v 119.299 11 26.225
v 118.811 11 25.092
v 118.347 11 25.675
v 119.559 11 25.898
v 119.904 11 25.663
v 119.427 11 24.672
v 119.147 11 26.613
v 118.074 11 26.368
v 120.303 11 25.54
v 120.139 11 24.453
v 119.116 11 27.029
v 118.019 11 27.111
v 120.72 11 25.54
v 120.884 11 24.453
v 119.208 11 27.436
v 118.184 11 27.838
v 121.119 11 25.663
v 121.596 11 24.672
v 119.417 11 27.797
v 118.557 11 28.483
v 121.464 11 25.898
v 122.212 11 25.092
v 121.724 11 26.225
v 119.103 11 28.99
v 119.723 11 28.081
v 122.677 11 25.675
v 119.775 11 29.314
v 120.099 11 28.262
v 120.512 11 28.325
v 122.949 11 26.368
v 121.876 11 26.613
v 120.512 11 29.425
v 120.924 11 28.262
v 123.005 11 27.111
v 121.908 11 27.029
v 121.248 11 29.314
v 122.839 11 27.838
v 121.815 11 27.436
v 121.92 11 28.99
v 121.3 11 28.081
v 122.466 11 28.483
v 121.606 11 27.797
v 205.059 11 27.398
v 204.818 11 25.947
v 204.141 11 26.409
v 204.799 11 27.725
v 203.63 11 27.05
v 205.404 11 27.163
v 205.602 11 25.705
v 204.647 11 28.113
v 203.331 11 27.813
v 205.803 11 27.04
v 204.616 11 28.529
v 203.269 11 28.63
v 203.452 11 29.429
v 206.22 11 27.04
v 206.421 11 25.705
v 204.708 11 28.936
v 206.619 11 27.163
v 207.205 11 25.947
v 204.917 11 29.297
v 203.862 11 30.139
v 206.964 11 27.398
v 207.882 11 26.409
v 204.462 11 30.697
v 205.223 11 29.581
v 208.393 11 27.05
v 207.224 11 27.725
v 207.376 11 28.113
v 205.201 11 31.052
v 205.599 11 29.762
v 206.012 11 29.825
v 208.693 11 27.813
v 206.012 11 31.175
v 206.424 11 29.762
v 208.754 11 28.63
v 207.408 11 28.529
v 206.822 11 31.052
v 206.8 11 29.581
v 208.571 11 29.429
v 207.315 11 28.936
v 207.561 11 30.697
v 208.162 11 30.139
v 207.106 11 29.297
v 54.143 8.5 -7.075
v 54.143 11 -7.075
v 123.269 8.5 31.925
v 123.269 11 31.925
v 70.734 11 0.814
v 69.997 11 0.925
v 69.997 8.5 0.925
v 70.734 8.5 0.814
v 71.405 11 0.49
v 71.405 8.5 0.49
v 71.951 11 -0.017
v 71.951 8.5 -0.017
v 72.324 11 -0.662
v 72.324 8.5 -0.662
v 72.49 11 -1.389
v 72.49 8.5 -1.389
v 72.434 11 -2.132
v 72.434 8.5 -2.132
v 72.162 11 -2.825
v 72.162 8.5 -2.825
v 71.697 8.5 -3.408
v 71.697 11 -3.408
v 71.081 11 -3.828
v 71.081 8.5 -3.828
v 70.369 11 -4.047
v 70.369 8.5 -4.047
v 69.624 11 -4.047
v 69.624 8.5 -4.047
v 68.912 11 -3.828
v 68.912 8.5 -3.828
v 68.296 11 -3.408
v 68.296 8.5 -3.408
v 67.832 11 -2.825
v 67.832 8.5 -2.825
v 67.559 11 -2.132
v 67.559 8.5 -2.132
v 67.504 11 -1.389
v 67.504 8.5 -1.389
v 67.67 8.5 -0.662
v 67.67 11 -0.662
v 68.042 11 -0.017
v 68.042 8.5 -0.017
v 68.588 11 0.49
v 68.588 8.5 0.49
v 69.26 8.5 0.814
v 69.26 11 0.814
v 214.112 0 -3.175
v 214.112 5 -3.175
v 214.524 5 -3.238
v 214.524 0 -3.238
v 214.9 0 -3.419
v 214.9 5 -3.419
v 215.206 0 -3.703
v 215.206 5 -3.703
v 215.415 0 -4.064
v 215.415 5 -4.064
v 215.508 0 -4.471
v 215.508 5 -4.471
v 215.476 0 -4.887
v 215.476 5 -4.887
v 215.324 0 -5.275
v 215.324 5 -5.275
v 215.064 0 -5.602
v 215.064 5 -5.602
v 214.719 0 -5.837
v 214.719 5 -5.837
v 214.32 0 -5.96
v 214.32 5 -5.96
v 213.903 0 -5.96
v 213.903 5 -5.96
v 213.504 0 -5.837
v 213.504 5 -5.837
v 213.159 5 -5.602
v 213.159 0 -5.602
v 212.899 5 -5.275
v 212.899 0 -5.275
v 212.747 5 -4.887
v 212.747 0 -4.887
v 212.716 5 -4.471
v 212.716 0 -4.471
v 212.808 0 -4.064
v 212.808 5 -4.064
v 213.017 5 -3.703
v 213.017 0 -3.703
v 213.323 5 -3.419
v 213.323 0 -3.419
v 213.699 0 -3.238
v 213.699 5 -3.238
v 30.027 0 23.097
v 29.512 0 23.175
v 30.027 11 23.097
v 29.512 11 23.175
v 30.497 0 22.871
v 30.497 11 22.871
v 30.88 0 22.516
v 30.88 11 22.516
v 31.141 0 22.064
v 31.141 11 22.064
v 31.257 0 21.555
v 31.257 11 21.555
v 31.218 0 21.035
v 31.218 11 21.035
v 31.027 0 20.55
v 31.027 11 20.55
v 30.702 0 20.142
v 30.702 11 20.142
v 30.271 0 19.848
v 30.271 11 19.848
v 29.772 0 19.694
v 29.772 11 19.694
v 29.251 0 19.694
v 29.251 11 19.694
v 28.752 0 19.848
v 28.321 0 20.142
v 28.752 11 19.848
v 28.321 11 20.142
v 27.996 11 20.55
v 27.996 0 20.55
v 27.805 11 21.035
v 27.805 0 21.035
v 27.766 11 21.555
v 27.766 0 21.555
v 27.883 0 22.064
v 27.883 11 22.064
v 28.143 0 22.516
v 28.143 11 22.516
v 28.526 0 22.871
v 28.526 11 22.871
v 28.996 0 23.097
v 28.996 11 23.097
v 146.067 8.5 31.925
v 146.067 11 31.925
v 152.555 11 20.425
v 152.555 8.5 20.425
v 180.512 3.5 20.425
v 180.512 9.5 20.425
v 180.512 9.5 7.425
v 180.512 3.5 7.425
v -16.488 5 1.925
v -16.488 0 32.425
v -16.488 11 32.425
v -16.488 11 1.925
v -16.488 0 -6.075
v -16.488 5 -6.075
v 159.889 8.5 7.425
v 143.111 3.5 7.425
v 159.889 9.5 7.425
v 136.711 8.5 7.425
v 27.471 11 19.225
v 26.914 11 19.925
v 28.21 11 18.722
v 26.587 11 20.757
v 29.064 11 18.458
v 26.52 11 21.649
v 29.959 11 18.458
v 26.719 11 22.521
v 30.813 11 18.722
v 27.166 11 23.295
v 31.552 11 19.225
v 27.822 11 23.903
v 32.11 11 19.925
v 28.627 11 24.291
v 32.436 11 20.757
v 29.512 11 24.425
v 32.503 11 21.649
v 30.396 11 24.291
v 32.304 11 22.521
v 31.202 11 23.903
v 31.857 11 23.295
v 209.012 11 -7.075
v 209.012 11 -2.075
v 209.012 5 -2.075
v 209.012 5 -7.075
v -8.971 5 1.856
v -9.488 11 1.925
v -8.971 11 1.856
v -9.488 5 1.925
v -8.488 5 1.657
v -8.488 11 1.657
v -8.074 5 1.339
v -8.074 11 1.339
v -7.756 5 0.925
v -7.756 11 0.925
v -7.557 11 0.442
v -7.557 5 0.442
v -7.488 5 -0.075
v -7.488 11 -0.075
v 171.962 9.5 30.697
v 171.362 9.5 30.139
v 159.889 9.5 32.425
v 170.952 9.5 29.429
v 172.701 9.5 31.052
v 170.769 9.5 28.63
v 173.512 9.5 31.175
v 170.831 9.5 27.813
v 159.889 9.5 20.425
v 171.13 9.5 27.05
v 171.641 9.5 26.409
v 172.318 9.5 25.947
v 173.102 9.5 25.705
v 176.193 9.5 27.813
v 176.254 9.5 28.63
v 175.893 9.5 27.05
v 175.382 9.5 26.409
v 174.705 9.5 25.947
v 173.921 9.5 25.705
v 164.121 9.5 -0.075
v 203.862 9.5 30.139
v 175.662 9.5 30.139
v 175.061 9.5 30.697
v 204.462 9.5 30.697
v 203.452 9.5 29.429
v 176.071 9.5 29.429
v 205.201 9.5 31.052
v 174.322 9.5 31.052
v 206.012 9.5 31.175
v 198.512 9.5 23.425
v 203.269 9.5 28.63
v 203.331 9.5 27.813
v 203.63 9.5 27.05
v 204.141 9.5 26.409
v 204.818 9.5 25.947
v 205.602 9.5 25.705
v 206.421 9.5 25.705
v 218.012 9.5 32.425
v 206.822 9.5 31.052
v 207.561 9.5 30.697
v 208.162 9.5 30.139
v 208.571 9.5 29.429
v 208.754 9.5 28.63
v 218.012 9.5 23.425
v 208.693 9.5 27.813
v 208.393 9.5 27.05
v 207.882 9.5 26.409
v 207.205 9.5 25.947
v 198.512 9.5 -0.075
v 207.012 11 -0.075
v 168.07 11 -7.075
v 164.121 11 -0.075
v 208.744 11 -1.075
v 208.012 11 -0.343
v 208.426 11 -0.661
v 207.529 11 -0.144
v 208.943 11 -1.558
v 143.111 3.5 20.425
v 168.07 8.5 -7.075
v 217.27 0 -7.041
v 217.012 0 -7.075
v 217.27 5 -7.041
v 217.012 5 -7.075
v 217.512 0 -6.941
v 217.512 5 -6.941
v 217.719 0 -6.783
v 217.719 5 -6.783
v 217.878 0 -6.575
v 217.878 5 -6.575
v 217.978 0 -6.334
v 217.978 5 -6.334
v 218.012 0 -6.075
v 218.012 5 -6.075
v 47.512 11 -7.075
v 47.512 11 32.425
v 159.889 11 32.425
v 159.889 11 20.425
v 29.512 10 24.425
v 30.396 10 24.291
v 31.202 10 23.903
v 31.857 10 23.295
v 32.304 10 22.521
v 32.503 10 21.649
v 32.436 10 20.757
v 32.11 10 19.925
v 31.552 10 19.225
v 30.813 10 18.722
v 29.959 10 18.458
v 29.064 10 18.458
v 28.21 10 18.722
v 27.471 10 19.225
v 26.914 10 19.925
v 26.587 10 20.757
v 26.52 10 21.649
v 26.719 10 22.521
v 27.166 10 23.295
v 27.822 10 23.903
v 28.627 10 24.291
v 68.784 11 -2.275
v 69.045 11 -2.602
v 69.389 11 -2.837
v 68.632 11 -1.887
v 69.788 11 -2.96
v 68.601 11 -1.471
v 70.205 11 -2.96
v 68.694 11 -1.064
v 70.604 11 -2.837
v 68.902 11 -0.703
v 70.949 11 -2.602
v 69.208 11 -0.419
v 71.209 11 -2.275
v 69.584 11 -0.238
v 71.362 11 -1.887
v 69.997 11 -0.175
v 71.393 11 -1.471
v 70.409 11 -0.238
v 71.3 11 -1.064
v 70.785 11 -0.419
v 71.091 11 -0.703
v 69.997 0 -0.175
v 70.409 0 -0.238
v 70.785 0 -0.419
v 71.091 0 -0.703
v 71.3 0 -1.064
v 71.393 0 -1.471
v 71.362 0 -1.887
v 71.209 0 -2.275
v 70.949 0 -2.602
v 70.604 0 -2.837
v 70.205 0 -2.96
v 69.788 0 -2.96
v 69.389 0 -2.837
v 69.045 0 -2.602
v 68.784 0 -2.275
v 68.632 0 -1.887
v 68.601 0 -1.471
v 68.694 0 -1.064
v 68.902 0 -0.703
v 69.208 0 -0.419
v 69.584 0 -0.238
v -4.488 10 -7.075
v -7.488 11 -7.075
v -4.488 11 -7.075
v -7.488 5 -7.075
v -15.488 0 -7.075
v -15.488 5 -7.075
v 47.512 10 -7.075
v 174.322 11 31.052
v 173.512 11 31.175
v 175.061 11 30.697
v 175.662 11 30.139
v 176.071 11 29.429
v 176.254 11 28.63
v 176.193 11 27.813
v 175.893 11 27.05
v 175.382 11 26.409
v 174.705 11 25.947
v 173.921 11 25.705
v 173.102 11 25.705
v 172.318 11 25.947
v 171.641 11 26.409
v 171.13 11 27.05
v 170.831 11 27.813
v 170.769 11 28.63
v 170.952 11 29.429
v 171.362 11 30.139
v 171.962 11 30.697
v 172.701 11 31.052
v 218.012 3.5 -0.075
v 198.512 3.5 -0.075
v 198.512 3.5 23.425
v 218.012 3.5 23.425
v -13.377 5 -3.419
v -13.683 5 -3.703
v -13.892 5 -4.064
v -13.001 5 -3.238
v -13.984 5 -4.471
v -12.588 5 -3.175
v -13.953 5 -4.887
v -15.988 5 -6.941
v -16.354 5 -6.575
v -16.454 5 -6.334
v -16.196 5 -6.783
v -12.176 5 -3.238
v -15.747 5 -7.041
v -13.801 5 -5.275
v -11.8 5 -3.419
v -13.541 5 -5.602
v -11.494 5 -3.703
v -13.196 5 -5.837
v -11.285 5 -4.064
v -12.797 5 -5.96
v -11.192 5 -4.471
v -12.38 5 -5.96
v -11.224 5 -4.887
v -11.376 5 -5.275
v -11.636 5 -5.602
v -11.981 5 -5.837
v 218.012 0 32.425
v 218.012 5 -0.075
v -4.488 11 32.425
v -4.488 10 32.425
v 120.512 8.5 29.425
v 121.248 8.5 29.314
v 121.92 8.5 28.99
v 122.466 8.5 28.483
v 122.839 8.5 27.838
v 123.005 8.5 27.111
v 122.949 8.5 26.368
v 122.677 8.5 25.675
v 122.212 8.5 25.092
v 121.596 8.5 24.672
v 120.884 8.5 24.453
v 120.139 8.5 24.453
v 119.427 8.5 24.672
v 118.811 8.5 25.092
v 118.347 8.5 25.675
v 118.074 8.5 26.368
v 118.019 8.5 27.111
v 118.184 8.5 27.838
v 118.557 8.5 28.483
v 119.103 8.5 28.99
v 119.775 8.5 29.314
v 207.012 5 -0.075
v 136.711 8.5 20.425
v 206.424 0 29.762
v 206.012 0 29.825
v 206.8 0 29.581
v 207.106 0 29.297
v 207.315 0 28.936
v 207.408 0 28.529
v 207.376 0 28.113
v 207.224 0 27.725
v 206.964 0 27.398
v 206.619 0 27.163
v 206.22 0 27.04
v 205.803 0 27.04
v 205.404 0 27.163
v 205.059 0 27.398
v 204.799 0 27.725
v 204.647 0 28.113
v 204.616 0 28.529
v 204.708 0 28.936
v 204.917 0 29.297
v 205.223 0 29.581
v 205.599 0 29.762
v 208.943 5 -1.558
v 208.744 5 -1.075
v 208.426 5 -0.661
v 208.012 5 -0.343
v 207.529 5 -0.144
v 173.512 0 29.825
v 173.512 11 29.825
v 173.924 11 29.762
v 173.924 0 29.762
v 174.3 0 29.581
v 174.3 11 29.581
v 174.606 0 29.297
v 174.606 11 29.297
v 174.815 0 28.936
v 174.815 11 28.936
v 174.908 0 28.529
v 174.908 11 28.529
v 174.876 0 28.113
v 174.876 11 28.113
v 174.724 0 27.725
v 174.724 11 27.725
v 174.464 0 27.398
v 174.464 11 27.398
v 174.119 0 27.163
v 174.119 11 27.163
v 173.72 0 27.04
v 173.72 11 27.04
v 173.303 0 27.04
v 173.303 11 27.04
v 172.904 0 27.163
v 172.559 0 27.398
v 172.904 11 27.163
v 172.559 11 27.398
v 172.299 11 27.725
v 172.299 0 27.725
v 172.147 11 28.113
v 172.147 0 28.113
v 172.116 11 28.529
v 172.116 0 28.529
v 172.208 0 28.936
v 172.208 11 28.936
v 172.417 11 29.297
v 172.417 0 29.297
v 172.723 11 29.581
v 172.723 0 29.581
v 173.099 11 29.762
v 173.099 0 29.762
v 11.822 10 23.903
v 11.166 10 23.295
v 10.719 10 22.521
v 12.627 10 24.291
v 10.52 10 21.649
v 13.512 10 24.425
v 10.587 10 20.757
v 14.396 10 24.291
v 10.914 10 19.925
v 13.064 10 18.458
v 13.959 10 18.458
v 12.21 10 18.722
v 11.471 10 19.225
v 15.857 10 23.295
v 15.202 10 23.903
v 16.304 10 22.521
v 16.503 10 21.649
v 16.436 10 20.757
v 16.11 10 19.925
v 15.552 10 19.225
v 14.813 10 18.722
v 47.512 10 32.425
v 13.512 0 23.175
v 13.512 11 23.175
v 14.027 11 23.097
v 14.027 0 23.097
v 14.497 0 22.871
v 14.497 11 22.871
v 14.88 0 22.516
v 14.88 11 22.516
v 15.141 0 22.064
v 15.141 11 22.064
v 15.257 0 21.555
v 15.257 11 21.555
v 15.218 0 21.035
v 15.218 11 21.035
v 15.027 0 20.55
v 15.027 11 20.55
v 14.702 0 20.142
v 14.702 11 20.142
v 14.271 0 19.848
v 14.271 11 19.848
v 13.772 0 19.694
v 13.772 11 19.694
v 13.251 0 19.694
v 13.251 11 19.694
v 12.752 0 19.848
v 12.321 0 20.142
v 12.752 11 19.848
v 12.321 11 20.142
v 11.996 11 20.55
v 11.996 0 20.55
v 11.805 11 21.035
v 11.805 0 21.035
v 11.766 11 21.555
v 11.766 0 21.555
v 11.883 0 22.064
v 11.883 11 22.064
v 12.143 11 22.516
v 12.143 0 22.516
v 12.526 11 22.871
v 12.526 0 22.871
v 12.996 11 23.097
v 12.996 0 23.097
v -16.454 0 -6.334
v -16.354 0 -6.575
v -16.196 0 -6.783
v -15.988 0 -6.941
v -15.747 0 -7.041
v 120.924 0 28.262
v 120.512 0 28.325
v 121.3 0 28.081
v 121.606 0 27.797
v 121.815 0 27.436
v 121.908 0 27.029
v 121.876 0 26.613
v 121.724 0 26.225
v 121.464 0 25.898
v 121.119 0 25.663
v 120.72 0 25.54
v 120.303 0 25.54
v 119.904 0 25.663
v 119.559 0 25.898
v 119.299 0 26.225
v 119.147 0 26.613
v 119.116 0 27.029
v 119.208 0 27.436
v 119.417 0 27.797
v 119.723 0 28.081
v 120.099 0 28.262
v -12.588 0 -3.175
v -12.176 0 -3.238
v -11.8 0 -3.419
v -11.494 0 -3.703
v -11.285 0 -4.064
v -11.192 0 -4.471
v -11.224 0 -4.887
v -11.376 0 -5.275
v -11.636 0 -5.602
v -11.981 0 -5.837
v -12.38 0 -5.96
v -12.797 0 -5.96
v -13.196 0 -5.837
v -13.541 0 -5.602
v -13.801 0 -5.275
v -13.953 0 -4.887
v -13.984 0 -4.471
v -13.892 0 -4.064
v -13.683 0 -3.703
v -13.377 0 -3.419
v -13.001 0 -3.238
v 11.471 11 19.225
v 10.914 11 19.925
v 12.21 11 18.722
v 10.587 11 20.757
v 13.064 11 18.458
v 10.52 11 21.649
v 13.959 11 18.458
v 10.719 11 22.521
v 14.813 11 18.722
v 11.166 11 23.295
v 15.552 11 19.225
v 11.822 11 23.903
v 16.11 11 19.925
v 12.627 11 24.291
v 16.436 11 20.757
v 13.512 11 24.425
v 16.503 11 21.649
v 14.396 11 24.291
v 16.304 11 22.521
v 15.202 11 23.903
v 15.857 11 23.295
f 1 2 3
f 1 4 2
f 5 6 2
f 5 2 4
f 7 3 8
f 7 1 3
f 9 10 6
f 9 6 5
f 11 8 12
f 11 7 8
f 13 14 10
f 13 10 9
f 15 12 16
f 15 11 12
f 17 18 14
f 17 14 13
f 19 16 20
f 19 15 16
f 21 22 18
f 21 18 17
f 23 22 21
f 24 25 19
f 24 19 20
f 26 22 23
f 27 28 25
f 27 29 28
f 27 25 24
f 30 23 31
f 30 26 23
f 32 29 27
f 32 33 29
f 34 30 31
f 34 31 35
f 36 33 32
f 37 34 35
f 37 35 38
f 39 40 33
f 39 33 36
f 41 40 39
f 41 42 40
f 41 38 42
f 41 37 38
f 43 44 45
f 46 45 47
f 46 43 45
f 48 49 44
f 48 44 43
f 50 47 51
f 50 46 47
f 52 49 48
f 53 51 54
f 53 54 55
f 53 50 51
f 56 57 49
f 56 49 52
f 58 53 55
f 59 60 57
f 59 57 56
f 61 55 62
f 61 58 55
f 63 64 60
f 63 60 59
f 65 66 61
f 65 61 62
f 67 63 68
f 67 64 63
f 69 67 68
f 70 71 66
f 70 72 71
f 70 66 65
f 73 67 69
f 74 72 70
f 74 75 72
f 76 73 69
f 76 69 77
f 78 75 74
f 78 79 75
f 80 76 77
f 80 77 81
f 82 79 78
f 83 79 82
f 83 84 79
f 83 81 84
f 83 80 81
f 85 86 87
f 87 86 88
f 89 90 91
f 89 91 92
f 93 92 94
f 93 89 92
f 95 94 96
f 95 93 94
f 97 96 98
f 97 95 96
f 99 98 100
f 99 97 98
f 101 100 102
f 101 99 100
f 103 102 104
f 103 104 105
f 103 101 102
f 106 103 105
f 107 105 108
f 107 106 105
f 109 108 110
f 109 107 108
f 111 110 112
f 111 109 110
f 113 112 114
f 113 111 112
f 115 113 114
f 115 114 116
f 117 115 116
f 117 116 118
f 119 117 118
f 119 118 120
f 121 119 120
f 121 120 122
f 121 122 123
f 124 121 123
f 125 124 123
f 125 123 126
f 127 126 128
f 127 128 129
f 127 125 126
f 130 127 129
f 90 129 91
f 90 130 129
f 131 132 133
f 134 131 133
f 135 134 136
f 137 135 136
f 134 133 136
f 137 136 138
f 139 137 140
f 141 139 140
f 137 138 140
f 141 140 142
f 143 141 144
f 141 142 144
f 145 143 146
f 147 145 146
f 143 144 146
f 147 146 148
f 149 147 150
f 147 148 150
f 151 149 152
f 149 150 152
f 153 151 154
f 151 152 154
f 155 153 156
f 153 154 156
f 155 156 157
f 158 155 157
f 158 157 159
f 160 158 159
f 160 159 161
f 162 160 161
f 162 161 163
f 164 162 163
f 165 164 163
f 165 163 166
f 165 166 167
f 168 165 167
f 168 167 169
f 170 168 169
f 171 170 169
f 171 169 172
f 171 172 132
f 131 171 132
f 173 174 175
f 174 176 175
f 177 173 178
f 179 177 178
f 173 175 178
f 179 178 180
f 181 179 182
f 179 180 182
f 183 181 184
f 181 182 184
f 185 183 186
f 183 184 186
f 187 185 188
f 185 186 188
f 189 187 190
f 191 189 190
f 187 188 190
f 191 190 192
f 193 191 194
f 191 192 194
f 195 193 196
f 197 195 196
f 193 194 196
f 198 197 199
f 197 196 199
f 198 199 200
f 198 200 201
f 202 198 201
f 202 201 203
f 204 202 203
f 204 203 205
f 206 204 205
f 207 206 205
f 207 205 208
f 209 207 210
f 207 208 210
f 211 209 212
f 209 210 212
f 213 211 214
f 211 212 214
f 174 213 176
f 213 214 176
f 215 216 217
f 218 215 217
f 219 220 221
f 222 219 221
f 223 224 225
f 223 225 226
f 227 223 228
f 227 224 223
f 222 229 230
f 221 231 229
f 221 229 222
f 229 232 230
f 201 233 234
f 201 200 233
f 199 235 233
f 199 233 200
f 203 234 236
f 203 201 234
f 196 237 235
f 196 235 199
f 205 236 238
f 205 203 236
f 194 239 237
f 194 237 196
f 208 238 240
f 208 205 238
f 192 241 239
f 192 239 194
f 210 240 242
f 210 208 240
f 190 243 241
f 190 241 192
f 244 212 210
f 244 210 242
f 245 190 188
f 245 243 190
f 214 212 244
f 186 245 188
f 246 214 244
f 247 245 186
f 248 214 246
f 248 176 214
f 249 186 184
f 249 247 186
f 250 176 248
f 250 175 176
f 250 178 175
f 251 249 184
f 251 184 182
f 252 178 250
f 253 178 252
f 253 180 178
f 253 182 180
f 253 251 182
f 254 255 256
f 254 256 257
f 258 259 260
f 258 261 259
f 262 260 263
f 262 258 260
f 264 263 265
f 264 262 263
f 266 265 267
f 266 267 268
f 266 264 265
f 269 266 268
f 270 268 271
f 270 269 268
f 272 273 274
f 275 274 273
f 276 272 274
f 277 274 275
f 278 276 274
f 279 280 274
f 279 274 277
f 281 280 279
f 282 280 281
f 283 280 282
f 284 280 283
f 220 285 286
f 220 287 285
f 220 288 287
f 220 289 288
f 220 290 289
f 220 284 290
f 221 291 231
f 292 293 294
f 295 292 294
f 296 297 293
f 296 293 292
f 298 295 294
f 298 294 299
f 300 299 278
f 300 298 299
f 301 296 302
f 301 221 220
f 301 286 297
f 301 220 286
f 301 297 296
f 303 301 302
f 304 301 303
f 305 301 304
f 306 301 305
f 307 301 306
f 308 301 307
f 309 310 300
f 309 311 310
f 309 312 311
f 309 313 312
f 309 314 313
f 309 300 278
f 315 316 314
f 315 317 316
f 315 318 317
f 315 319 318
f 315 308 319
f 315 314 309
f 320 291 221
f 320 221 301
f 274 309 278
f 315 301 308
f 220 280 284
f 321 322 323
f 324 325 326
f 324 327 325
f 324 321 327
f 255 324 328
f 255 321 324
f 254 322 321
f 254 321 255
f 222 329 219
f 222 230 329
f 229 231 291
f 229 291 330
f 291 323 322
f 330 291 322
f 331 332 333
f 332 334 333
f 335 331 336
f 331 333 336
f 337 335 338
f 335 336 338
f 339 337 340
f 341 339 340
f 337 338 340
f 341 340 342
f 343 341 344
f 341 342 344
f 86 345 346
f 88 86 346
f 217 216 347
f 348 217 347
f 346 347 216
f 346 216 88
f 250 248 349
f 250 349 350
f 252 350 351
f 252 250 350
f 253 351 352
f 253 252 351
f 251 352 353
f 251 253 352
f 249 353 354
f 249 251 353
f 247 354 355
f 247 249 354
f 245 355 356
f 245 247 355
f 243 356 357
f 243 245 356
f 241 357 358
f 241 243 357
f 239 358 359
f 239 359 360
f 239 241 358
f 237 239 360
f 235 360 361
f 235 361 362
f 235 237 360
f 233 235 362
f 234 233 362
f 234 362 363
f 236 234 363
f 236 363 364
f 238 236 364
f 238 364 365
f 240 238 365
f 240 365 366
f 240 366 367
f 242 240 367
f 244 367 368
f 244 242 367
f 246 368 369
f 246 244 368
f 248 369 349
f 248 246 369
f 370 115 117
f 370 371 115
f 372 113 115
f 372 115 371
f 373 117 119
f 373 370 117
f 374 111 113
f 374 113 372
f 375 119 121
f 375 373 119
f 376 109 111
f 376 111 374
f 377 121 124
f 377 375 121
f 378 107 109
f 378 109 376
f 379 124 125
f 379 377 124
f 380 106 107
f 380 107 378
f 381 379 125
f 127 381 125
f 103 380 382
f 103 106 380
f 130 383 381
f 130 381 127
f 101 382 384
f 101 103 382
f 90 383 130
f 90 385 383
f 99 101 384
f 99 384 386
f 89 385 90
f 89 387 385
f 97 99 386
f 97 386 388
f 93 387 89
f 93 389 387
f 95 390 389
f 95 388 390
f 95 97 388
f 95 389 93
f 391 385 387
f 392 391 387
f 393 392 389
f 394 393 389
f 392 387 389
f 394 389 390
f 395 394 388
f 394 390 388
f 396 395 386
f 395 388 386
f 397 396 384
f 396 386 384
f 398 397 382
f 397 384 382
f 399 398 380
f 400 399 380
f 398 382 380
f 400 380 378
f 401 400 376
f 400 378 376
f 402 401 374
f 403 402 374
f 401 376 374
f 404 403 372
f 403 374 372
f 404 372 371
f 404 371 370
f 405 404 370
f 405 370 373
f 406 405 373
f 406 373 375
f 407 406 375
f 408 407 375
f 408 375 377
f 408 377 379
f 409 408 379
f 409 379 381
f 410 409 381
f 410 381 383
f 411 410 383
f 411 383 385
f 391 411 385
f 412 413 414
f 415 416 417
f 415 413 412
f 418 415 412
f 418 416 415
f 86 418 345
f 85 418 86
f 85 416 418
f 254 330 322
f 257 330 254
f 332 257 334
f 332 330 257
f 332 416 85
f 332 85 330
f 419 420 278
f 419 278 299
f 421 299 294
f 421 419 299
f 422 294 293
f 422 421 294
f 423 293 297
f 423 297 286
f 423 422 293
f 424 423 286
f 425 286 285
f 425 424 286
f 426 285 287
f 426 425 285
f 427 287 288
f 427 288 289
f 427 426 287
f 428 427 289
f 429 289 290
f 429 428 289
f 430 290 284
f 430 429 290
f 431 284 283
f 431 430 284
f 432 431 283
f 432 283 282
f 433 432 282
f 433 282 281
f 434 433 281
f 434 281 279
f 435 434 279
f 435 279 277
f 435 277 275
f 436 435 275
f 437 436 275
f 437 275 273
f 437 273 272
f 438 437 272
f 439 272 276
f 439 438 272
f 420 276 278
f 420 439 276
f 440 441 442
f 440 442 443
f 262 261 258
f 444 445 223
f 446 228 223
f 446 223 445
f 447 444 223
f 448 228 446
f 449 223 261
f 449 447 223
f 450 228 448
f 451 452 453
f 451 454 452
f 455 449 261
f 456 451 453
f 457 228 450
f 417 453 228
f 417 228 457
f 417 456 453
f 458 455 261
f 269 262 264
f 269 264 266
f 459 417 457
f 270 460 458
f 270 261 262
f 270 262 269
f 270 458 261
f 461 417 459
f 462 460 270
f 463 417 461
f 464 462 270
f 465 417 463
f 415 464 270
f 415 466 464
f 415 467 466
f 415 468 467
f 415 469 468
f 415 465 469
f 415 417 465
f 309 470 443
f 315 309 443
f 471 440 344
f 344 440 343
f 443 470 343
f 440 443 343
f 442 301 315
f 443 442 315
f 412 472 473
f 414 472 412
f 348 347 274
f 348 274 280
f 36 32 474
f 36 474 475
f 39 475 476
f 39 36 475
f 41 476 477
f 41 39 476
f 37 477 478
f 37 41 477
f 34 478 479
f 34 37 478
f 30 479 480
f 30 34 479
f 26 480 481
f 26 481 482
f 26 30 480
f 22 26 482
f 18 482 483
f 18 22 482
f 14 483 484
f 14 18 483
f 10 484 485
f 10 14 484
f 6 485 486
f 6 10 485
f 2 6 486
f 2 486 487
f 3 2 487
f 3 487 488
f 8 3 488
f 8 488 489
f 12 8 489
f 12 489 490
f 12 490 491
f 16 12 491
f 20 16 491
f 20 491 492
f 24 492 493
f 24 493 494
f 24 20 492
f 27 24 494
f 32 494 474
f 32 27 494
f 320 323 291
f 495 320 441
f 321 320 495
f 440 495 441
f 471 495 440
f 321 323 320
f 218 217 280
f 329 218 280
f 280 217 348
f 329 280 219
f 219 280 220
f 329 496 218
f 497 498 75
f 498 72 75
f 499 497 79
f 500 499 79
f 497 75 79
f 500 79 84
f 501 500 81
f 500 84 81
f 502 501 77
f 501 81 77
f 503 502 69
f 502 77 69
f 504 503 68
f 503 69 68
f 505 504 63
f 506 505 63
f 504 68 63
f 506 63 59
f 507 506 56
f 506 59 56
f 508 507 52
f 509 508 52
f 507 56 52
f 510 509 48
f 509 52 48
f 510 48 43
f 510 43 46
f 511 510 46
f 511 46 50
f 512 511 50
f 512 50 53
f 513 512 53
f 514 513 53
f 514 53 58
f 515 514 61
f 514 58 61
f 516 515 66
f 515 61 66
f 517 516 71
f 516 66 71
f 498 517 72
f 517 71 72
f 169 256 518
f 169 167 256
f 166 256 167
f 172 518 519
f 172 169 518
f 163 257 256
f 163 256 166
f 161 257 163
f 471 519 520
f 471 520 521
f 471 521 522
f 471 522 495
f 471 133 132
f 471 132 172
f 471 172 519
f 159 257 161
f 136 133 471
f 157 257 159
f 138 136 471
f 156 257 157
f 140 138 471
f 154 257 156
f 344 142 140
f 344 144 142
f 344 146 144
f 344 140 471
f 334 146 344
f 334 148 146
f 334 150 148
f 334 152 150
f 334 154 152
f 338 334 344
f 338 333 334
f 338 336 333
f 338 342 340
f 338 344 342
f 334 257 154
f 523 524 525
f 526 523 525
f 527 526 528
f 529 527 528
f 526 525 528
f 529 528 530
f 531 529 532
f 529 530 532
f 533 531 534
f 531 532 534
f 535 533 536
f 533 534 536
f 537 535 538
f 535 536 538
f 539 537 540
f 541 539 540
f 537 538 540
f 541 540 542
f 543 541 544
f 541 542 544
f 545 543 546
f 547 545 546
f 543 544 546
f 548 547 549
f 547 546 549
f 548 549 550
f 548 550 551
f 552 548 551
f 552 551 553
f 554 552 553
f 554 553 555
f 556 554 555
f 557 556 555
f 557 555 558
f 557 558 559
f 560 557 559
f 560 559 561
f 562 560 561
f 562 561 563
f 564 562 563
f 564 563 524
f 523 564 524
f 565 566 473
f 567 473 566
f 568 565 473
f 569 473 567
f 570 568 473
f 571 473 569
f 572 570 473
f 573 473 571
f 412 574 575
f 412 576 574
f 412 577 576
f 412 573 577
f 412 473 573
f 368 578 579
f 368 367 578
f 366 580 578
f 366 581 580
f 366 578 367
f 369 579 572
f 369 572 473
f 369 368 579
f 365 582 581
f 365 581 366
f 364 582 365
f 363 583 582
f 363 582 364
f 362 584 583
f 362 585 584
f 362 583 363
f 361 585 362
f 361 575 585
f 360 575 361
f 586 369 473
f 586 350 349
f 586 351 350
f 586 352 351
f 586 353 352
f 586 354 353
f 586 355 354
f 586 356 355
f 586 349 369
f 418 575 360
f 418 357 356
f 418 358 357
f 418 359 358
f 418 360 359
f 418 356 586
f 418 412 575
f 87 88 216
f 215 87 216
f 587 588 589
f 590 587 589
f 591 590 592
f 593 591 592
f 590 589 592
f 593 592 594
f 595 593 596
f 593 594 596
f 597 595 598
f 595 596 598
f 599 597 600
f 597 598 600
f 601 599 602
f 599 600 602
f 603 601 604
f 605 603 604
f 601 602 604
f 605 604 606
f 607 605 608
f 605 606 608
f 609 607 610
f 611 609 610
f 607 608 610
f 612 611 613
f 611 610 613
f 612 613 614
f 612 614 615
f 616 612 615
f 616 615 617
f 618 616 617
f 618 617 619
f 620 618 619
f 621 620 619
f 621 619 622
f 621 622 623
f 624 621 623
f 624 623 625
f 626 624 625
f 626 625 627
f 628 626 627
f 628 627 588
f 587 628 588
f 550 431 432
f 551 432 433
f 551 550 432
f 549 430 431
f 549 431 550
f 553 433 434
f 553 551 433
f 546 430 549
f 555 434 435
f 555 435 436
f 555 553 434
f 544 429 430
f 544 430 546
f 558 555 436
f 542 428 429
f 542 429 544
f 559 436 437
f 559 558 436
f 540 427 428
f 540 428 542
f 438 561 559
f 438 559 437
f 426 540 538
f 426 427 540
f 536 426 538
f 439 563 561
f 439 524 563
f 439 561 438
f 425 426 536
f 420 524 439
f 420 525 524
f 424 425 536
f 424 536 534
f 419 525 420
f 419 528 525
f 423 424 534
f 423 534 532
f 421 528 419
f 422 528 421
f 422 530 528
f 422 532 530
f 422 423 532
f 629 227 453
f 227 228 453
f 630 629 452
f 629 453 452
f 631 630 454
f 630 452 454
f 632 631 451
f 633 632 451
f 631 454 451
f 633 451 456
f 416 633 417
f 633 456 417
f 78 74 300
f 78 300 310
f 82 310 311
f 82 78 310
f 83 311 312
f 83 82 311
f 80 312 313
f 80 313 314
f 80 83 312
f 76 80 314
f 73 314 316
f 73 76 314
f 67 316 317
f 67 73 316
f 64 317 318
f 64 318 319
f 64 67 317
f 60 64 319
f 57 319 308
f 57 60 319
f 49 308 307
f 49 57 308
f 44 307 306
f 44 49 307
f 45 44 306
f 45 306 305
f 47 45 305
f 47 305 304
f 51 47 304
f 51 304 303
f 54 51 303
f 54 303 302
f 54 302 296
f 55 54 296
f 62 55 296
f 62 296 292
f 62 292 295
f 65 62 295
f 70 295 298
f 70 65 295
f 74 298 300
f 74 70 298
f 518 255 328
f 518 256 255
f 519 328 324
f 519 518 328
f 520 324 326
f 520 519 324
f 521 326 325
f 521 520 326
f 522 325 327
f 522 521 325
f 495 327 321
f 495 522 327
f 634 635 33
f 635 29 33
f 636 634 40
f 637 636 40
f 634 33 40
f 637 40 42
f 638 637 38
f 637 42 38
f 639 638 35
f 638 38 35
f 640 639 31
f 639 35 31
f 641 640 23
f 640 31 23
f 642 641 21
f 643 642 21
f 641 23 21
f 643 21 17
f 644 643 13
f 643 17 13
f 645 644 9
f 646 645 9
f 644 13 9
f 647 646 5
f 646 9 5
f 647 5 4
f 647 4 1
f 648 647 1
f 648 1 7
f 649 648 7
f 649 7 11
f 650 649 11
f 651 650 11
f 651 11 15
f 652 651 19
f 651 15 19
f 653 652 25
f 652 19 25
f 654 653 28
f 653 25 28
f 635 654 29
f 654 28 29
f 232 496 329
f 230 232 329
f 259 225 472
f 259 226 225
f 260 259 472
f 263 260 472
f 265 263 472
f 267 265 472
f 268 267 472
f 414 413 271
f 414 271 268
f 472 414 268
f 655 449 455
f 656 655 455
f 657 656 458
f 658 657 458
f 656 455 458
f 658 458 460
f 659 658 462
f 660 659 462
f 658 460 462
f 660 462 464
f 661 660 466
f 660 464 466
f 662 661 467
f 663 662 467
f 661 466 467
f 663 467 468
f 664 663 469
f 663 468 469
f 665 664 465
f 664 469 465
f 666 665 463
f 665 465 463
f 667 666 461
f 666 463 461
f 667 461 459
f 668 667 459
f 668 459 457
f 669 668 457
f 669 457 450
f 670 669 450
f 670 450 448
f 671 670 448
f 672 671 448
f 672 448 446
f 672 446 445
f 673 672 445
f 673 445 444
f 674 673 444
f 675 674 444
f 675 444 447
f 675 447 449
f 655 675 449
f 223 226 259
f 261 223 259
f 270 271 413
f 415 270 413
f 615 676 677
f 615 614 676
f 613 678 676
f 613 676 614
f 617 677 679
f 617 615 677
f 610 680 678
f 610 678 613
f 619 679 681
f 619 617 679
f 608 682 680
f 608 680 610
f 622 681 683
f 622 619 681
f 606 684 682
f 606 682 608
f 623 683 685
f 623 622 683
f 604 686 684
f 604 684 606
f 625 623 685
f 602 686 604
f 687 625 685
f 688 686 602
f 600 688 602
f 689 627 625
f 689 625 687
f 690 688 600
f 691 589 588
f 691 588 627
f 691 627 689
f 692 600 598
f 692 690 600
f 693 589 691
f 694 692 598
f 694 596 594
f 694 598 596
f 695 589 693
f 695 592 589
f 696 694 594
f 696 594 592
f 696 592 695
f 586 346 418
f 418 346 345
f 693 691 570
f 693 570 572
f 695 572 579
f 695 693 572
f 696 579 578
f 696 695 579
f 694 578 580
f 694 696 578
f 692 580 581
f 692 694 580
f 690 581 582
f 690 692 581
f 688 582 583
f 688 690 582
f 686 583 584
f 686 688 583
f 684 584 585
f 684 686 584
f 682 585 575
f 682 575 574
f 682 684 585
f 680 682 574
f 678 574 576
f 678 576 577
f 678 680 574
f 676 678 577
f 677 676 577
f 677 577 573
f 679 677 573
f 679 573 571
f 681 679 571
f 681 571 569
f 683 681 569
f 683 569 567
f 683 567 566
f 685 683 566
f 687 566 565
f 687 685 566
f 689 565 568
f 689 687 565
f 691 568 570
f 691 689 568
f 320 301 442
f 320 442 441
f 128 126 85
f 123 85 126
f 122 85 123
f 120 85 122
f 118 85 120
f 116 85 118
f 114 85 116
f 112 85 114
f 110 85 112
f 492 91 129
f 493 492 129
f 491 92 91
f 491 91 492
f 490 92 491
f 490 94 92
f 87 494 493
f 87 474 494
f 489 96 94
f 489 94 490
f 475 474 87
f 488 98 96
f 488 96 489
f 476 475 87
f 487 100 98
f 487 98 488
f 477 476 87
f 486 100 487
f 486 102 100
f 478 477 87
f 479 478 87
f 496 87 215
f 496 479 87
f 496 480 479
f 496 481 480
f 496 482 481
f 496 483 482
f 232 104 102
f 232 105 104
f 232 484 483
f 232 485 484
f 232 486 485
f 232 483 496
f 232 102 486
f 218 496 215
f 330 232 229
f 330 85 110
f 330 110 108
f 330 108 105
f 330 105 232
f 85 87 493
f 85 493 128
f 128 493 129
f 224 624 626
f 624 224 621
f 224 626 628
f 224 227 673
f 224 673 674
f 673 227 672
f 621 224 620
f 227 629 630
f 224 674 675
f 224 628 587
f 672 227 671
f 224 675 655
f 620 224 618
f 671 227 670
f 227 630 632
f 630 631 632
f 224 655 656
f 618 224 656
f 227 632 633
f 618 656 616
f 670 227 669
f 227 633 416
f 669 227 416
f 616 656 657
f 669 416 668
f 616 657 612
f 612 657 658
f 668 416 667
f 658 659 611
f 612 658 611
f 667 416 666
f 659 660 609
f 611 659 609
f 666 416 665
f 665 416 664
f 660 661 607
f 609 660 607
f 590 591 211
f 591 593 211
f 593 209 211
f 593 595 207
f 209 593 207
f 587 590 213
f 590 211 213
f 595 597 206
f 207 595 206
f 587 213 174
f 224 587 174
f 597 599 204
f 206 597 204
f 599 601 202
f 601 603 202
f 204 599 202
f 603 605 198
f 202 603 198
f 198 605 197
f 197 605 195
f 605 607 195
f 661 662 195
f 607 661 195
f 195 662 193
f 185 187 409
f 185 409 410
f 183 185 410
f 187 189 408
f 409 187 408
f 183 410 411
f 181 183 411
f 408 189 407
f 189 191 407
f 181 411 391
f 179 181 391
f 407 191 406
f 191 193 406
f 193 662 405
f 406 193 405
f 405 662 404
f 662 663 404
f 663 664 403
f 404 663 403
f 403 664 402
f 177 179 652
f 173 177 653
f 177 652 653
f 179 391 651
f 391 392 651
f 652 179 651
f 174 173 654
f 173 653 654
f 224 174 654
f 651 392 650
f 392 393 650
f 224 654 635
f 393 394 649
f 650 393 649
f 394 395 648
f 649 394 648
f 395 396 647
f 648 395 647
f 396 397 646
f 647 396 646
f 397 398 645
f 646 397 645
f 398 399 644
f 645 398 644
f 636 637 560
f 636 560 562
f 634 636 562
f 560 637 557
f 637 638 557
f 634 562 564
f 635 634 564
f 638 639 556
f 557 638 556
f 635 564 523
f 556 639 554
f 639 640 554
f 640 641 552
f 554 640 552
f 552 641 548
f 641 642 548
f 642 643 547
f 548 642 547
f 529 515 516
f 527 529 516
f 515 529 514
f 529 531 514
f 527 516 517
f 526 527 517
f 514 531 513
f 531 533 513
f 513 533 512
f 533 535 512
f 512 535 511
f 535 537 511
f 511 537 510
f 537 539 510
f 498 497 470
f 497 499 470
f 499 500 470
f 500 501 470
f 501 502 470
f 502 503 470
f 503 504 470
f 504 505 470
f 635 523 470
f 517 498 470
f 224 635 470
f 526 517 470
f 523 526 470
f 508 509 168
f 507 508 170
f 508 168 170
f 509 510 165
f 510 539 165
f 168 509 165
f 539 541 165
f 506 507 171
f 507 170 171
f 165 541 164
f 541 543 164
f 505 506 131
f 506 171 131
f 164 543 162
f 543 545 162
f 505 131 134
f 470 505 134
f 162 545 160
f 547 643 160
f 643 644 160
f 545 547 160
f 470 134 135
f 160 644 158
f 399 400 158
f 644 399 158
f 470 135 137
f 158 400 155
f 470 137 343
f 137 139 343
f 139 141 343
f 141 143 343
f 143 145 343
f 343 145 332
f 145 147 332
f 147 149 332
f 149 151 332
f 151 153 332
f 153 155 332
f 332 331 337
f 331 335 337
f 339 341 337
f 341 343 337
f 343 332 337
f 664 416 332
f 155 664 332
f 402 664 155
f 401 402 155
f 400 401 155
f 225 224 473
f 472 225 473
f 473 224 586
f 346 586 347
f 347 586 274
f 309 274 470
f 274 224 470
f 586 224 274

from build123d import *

# Parameters (mm, degrees)
SKETCH_1_W           = 234.5
SKETCH_1_H           = 39.5
EXTRUDE_1_DEPTH      = 11
SKETCH_2_W           = 9
SKETCH_2_H           = 9
SKETCH_2_H_2         = 7
CUT_EXTRUDE_1_DEPTH  = 6
FILLET_2_R           = 2
SKETCH_3_R           = 1.4
CUT_EXTRUDE_2_DEPTH  = 6
FILLET_5_R           = 1
SKETCH_4_R           = 1.4
CUT_EXTRUDE_3_DEPTH  = 30
SKETCH_6_W           = 19.5
SKETCH_6_H           = 23.5
CUT_EXTRUDE_4_DEPTH  = 7.5
FILLET_7_R           = 2
SKETCH_7_W           = 37
SKETCH_7_H           = 13
CUT_EXTRUDE_5_DEPTH  = 7.5
CHAMFER_1_SIZE       = 10
CHAMFER_1_SIZE_2     = 7.812856265
SKETCH_8_R           = 1.4
CUT_EXTRUDE_6_DEPTH  = 37.5
CUT_EXTRUDE_8_DEPTH  = 2.5
SKETCH_10_R          = 1.75
CUT_EXTRUDE_9_DEPTH  = 13.5
SKETCH_11_W          = 52
SKETCH_11_H          = 48
CUT_EXTRUDE_10_DEPTH = 1
EXTRUDE_START        = 1
SKETCH_12_R          = 3
SKETCH_12_R_2        = 1.75
EXTRUDE_2_DEPTH      = 1
EXTRUDE_START_2      = 2.5
SKETCH_13_R          = 2.5
SKETCH_13_R_2        = 1.4
EXTRUDE_3_DEPTH      = 2.5
SKETCH_14_W          = 58.122310869
SKETCH_14_H          = 32.5
CUT_EXTRUDE_11_DEPTH = 1.5
EXTRUDE_START_3      = 1.5
SKETCH_15_R          = 2.75
SKETCH_15_R_2        = 1.4
EXTRUDE_4_DEPTH      = 1.5
CUT_EXTRUDE_12_DEPTH = 2.5


# Some blends are built 0.0001 mm under size
with BuildPart() as part:
    # 草图1 → 凸台-拉伸1 (new body)
    with BuildSketch(Plane(origin=(0, 0, 0), x_dir=(1, 0, 0), z_dir=(0, 1, 0))):
        with Locations((100.761595342, -12.674606198)):
            Rectangle(SKETCH_1_W, SKETCH_1_H)
    extrude(amount=EXTRUDE_1_DEPTH)

    # 草图2 → 切除-拉伸1 (cut)
    with BuildSketch(Plane(origin=(0, 11, 0), x_dir=(1, 0, 0), z_dir=(0, 1, 0))):
        with Locations((-11.988404658, 2.575393802)):
            Rectangle(SKETCH_2_W, SKETCH_2_H)
        with Locations((213.511595342, 3.575393802)):
            Rectangle(SKETCH_2_W, SKETCH_2_H_2)
    extrude(amount=-CUT_EXTRUDE_1_DEPTH, mode=Mode.SUBTRACT)

    # 圆角2
    fillet_2_edges = [part.edges().sort_by_distance(p)[0] for p in [
        (-7.488404658, 8, 1.924606198),
        (209.011595342, 8, -0.075393802),
    ]]
    fillet(fillet_2_edges, radius=FILLET_2_R)

    # 草图3 → 切除-拉伸2 (cut)
    with BuildSketch(Plane(origin=(0, 5, 0), x_dir=(1, 0, 0), z_dir=(0, 1, 0))):
        with Locations(Location((214.111595342, 4.575393802, 0), (0, 0, 270))):
            Circle(SKETCH_3_R)
        with Locations(Location((-12.588404658, 4.575393802, 0), (0, 0, 270))):
            Circle(SKETCH_3_R)
    extrude(amount=-CUT_EXTRUDE_2_DEPTH, mode=Mode.SUBTRACT)

    # 圆角5
    fillet_5_edges = [part.edges().sort_by_distance(p)[0] for p in [
        (-16.488404658, 2.5, -7.075393802),
        (218.011595342, 2.5, -7.075393802),
    ]]
    fillet(fillet_5_edges, radius=FILLET_5_R)

    # 草图4 → 切除-拉伸3 (cut)
    with BuildSketch(Plane(origin=(0, 11, 0), x_dir=(1, 0, 0), z_dir=(0, 1, 0))):
        with Locations(Location((206.011595342, -28.424606198, 0), (0, 0, 270))):
            Circle(SKETCH_4_R)
        with Locations(Location((173.511595342, -28.424606198, 0), (0, 0, 270))):
            Circle(SKETCH_4_R)
    extrude(amount=-CUT_EXTRUDE_3_DEPTH, mode=Mode.SUBTRACT)

    # 草图6 → 切除-拉伸4 (cut)
    with BuildSketch(Plane(origin=(0, 11, 0), x_dir=(1, 0, 0), z_dir=(0, 1, 0))):
        with Locations((208.261595342, -11.674606198)):
            Rectangle(SKETCH_6_W, SKETCH_6_H)
    extrude(amount=-CUT_EXTRUDE_4_DEPTH, mode=Mode.SUBTRACT)

    # 圆角7
    fillet_7_edges = [part.edges().sort_by_distance(p)[0] for p in [
        (211.011595342, 8, -0.075393802),
    ]]
    fillet(fillet_7_edges, radius=FILLET_7_R - 0.0001)  # a hair under: the kernel refuses the full size

    # 草图7 → 切除-拉伸5 (cut)
    with BuildSketch(Plane(origin=(0, 11, 0), x_dir=(1, 0, 0), z_dir=(0, 1, 0))):
        with Locations((162.011595342, -13.924606198)):
            Rectangle(SKETCH_7_W, SKETCH_7_H)
    extrude(amount=-CUT_EXTRUDE_5_DEPTH, mode=Mode.SUBTRACT)

    # 倒角1
    # the kernel refuses this chamfer: 10, 7.812856265 mm, written as the material it takes off along each edge
    with BuildSketch(Plane(origin=(143.511595342, 11, 20.424606198), x_dir=(-0.9997151392093143, 0.023867141339117017, 0), z_dir=(0, 0, -1))) as chamfer_1_piece_1_section:
        Polygon((CHAMFER_1_SIZE * 0.999715139209, -CHAMFER_1_SIZE * 0.0238671413391), (-CHAMFER_1_SIZE_2 * 0.0238671413393, -CHAMFER_1_SIZE_2 * 0.999715139218), (0, 0), align=None)
    chamfer_1_piece_1 = extrude(amount=13, mode=Mode.PRIVATE)
    chamfer_1_piece_1 = split(chamfer_1_piece_1, bisect_by=Plane(origin=(140.173122789, 3.5, 13.924606198), z_dir=(0, 1, 0)), keep=Keep.TOP, mode=Mode.PRIVATE)
    add(chamfer_1_piece_1, mode=Mode.SUBTRACT)

    # 草图8 → 切除-拉伸6 (cut)
    with BuildSketch(Plane(origin=(0, 11, 0), x_dir=(1, 0, 0), z_dir=(0, 1, 0))):
        with Locations(Location((120.511595342, -26.924606198, 0), (0, 0, 270))):
            Circle(SKETCH_8_R)
        with Locations(Location((69.99674604, 1.575393802, 0), (0, 0, 270))):
            Circle(SKETCH_8_R)
    extrude(amount=-CUT_EXTRUDE_6_DEPTH, mode=Mode.SUBTRACT)

    # 草图9 → 切除-拉伸8 (cut)
    with BuildSketch(Plane(origin=(0, 11, 0), x_dir=(1, 0, 0), z_dir=(0, 1, 0))):
        Polygon((51.103694557, 8.790142976), (123.268586448, -31.924606198), (150.036795822, 15.520729333), (77.871903931, 56.235478507), align=None)
    extrude(amount=-CUT_EXTRUDE_8_DEPTH, mode=Mode.SUBTRACT)

    # 草图10 → 切除-拉伸9 (cut)
    with BuildSketch(Plane(origin=(0, 11, 0), x_dir=(1, 0, 0), z_dir=(0, 1, 0))):
        with Locations(Location((13.511595342, -21.424606198, 0), (0, 0, 270))):
            Circle(SKETCH_10_R)
        with Locations(Location((29.511595342, -21.424606198, 0), (0, 0, 270))):
            Circle(SKETCH_10_R)
    extrude(amount=-CUT_EXTRUDE_9_DEPTH, mode=Mode.SUBTRACT)

    # 草图11 → 切除-拉伸10 (cut)
    with BuildSketch(Plane(origin=(0, 11, 0), x_dir=(1, 0, 0), z_dir=(0, 1, 0))):
        with Locations((21.511595342, -8.424606198)):
            Rectangle(SKETCH_11_W, SKETCH_11_H)
    extrude(amount=-CUT_EXTRUDE_10_DEPTH, mode=Mode.SUBTRACT)

    # 草图12 → 凸台-拉伸2 (add)
    # profile 1 of 2: a face of its own
    with BuildSketch(Plane(origin=(0, 10, 0), x_dir=(1, 0, 0), z_dir=(0, 1, 0)).offset(EXTRUDE_START)):
        with Locations(Location((13.511595342, -21.424606198, 0), (0, 0, 270))):
            Circle(SKETCH_12_R)
        with Locations(Location((13.511595342, -21.424606198, 0), (0, 0, 270))):
            Circle(SKETCH_12_R_2, mode=Mode.SUBTRACT)
    # profile 2 of 2: a face of its own
    with BuildSketch(Plane(origin=(0, 10, 0), x_dir=(1, 0, 0), z_dir=(0, 1, 0)).offset(EXTRUDE_START)):
        with Locations(Location((29.511595342, -21.424606198, 0), (0, 0, 270))):
            Circle(SKETCH_12_R)
        with Locations(Location((29.511595342, -21.424606198, 0), (0, 0, 270))):
            Circle(SKETCH_12_R_2, mode=Mode.SUBTRACT)
    extrude(amount=-EXTRUDE_2_DEPTH)

    # 草图13 → 凸台-拉伸3 (add)
    # profile 1 of 2: a face of its own
    with BuildSketch(Plane(origin=(0, 8.5, 0), x_dir=(1, 0, 0), z_dir=(0, 1, 0)).offset(EXTRUDE_START_2)):
        with Locations(Location((69.99674604, 1.575393802, 0), (0, 0, 270))):
            Circle(SKETCH_13_R)
        with Locations(Location((69.99674604, 1.575393802, 0), (0, 0, 270))):
            Circle(SKETCH_13_R_2, mode=Mode.SUBTRACT)
    # profile 2 of 2: a face of its own
    with BuildSketch(Plane(origin=(0, 8.5, 0), x_dir=(1, 0, 0), z_dir=(0, 1, 0)).offset(EXTRUDE_START_2)):
        with Locations(Location((120.511595342, -26.924606198, 0), (0, 0, 270))):
            Circle(SKETCH_13_R)
        with Locations(Location((120.511595342, -26.924606198, 0), (0, 0, 270))):
            Circle(SKETCH_13_R_2, mode=Mode.SUBTRACT)
    extrude(amount=-EXTRUDE_3_DEPTH)

    # 草图14 → 切除-拉伸11 (cut)
    with BuildSketch(Plane(origin=(0, 11, 0), x_dir=(1, 0, 0), z_dir=(0, 1, 0))):
        with Locations((188.950439908, -16.174606198)):
            Rectangle(SKETCH_14_W, SKETCH_14_H)
    extrude(amount=-CUT_EXTRUDE_11_DEPTH, mode=Mode.SUBTRACT)

    # 草图15 → 凸台-拉伸4 (add)
    # profile 1 of 2: a face of its own
    with BuildSketch(Plane(origin=(0, 9.5, 0), x_dir=(1, 0, 0), z_dir=(0, 1, 0)).offset(EXTRUDE_START_3)):
        with Locations(Location((173.511595342, -28.424606198, 0), (0, 0, 270))):
            Circle(SKETCH_15_R)
        with Locations(Location((173.511595342, -28.424606198, 0), (0, 0, 270))):
            Circle(SKETCH_15_R_2, mode=Mode.SUBTRACT)
    # profile 2 of 2: a face of its own
    with BuildSketch(Plane(origin=(0, 9.5, 0), x_dir=(1, 0, 0), z_dir=(0, 1, 0)).offset(EXTRUDE_START_3)):
        with Locations(Location((206.011595342, -28.424606198, 0), (0, 0, 270))):
            Circle(SKETCH_15_R)
        with Locations(Location((206.011595342, -28.424606198, 0), (0, 0, 270))):
            Circle(SKETCH_15_R_2, mode=Mode.SUBTRACT)
    extrude(amount=-EXTRUDE_4_DEPTH)

    # 草图16 → 切除-拉伸12 (cut)
    with BuildSketch(Plane(origin=(0, 11, 0), x_dir=(1, 0, 0), z_dir=(0, 1, 0))):
        Polygon((123.268586448, -31.924606198), (146.066616294, -31.924606198), (168.070047273, 7.075393802), (145.272017426, 7.075393802), align=None)
    extrude(amount=-CUT_EXTRUDE_12_DEPTH, mode=Mode.SUBTRACT)


solid = part.part
